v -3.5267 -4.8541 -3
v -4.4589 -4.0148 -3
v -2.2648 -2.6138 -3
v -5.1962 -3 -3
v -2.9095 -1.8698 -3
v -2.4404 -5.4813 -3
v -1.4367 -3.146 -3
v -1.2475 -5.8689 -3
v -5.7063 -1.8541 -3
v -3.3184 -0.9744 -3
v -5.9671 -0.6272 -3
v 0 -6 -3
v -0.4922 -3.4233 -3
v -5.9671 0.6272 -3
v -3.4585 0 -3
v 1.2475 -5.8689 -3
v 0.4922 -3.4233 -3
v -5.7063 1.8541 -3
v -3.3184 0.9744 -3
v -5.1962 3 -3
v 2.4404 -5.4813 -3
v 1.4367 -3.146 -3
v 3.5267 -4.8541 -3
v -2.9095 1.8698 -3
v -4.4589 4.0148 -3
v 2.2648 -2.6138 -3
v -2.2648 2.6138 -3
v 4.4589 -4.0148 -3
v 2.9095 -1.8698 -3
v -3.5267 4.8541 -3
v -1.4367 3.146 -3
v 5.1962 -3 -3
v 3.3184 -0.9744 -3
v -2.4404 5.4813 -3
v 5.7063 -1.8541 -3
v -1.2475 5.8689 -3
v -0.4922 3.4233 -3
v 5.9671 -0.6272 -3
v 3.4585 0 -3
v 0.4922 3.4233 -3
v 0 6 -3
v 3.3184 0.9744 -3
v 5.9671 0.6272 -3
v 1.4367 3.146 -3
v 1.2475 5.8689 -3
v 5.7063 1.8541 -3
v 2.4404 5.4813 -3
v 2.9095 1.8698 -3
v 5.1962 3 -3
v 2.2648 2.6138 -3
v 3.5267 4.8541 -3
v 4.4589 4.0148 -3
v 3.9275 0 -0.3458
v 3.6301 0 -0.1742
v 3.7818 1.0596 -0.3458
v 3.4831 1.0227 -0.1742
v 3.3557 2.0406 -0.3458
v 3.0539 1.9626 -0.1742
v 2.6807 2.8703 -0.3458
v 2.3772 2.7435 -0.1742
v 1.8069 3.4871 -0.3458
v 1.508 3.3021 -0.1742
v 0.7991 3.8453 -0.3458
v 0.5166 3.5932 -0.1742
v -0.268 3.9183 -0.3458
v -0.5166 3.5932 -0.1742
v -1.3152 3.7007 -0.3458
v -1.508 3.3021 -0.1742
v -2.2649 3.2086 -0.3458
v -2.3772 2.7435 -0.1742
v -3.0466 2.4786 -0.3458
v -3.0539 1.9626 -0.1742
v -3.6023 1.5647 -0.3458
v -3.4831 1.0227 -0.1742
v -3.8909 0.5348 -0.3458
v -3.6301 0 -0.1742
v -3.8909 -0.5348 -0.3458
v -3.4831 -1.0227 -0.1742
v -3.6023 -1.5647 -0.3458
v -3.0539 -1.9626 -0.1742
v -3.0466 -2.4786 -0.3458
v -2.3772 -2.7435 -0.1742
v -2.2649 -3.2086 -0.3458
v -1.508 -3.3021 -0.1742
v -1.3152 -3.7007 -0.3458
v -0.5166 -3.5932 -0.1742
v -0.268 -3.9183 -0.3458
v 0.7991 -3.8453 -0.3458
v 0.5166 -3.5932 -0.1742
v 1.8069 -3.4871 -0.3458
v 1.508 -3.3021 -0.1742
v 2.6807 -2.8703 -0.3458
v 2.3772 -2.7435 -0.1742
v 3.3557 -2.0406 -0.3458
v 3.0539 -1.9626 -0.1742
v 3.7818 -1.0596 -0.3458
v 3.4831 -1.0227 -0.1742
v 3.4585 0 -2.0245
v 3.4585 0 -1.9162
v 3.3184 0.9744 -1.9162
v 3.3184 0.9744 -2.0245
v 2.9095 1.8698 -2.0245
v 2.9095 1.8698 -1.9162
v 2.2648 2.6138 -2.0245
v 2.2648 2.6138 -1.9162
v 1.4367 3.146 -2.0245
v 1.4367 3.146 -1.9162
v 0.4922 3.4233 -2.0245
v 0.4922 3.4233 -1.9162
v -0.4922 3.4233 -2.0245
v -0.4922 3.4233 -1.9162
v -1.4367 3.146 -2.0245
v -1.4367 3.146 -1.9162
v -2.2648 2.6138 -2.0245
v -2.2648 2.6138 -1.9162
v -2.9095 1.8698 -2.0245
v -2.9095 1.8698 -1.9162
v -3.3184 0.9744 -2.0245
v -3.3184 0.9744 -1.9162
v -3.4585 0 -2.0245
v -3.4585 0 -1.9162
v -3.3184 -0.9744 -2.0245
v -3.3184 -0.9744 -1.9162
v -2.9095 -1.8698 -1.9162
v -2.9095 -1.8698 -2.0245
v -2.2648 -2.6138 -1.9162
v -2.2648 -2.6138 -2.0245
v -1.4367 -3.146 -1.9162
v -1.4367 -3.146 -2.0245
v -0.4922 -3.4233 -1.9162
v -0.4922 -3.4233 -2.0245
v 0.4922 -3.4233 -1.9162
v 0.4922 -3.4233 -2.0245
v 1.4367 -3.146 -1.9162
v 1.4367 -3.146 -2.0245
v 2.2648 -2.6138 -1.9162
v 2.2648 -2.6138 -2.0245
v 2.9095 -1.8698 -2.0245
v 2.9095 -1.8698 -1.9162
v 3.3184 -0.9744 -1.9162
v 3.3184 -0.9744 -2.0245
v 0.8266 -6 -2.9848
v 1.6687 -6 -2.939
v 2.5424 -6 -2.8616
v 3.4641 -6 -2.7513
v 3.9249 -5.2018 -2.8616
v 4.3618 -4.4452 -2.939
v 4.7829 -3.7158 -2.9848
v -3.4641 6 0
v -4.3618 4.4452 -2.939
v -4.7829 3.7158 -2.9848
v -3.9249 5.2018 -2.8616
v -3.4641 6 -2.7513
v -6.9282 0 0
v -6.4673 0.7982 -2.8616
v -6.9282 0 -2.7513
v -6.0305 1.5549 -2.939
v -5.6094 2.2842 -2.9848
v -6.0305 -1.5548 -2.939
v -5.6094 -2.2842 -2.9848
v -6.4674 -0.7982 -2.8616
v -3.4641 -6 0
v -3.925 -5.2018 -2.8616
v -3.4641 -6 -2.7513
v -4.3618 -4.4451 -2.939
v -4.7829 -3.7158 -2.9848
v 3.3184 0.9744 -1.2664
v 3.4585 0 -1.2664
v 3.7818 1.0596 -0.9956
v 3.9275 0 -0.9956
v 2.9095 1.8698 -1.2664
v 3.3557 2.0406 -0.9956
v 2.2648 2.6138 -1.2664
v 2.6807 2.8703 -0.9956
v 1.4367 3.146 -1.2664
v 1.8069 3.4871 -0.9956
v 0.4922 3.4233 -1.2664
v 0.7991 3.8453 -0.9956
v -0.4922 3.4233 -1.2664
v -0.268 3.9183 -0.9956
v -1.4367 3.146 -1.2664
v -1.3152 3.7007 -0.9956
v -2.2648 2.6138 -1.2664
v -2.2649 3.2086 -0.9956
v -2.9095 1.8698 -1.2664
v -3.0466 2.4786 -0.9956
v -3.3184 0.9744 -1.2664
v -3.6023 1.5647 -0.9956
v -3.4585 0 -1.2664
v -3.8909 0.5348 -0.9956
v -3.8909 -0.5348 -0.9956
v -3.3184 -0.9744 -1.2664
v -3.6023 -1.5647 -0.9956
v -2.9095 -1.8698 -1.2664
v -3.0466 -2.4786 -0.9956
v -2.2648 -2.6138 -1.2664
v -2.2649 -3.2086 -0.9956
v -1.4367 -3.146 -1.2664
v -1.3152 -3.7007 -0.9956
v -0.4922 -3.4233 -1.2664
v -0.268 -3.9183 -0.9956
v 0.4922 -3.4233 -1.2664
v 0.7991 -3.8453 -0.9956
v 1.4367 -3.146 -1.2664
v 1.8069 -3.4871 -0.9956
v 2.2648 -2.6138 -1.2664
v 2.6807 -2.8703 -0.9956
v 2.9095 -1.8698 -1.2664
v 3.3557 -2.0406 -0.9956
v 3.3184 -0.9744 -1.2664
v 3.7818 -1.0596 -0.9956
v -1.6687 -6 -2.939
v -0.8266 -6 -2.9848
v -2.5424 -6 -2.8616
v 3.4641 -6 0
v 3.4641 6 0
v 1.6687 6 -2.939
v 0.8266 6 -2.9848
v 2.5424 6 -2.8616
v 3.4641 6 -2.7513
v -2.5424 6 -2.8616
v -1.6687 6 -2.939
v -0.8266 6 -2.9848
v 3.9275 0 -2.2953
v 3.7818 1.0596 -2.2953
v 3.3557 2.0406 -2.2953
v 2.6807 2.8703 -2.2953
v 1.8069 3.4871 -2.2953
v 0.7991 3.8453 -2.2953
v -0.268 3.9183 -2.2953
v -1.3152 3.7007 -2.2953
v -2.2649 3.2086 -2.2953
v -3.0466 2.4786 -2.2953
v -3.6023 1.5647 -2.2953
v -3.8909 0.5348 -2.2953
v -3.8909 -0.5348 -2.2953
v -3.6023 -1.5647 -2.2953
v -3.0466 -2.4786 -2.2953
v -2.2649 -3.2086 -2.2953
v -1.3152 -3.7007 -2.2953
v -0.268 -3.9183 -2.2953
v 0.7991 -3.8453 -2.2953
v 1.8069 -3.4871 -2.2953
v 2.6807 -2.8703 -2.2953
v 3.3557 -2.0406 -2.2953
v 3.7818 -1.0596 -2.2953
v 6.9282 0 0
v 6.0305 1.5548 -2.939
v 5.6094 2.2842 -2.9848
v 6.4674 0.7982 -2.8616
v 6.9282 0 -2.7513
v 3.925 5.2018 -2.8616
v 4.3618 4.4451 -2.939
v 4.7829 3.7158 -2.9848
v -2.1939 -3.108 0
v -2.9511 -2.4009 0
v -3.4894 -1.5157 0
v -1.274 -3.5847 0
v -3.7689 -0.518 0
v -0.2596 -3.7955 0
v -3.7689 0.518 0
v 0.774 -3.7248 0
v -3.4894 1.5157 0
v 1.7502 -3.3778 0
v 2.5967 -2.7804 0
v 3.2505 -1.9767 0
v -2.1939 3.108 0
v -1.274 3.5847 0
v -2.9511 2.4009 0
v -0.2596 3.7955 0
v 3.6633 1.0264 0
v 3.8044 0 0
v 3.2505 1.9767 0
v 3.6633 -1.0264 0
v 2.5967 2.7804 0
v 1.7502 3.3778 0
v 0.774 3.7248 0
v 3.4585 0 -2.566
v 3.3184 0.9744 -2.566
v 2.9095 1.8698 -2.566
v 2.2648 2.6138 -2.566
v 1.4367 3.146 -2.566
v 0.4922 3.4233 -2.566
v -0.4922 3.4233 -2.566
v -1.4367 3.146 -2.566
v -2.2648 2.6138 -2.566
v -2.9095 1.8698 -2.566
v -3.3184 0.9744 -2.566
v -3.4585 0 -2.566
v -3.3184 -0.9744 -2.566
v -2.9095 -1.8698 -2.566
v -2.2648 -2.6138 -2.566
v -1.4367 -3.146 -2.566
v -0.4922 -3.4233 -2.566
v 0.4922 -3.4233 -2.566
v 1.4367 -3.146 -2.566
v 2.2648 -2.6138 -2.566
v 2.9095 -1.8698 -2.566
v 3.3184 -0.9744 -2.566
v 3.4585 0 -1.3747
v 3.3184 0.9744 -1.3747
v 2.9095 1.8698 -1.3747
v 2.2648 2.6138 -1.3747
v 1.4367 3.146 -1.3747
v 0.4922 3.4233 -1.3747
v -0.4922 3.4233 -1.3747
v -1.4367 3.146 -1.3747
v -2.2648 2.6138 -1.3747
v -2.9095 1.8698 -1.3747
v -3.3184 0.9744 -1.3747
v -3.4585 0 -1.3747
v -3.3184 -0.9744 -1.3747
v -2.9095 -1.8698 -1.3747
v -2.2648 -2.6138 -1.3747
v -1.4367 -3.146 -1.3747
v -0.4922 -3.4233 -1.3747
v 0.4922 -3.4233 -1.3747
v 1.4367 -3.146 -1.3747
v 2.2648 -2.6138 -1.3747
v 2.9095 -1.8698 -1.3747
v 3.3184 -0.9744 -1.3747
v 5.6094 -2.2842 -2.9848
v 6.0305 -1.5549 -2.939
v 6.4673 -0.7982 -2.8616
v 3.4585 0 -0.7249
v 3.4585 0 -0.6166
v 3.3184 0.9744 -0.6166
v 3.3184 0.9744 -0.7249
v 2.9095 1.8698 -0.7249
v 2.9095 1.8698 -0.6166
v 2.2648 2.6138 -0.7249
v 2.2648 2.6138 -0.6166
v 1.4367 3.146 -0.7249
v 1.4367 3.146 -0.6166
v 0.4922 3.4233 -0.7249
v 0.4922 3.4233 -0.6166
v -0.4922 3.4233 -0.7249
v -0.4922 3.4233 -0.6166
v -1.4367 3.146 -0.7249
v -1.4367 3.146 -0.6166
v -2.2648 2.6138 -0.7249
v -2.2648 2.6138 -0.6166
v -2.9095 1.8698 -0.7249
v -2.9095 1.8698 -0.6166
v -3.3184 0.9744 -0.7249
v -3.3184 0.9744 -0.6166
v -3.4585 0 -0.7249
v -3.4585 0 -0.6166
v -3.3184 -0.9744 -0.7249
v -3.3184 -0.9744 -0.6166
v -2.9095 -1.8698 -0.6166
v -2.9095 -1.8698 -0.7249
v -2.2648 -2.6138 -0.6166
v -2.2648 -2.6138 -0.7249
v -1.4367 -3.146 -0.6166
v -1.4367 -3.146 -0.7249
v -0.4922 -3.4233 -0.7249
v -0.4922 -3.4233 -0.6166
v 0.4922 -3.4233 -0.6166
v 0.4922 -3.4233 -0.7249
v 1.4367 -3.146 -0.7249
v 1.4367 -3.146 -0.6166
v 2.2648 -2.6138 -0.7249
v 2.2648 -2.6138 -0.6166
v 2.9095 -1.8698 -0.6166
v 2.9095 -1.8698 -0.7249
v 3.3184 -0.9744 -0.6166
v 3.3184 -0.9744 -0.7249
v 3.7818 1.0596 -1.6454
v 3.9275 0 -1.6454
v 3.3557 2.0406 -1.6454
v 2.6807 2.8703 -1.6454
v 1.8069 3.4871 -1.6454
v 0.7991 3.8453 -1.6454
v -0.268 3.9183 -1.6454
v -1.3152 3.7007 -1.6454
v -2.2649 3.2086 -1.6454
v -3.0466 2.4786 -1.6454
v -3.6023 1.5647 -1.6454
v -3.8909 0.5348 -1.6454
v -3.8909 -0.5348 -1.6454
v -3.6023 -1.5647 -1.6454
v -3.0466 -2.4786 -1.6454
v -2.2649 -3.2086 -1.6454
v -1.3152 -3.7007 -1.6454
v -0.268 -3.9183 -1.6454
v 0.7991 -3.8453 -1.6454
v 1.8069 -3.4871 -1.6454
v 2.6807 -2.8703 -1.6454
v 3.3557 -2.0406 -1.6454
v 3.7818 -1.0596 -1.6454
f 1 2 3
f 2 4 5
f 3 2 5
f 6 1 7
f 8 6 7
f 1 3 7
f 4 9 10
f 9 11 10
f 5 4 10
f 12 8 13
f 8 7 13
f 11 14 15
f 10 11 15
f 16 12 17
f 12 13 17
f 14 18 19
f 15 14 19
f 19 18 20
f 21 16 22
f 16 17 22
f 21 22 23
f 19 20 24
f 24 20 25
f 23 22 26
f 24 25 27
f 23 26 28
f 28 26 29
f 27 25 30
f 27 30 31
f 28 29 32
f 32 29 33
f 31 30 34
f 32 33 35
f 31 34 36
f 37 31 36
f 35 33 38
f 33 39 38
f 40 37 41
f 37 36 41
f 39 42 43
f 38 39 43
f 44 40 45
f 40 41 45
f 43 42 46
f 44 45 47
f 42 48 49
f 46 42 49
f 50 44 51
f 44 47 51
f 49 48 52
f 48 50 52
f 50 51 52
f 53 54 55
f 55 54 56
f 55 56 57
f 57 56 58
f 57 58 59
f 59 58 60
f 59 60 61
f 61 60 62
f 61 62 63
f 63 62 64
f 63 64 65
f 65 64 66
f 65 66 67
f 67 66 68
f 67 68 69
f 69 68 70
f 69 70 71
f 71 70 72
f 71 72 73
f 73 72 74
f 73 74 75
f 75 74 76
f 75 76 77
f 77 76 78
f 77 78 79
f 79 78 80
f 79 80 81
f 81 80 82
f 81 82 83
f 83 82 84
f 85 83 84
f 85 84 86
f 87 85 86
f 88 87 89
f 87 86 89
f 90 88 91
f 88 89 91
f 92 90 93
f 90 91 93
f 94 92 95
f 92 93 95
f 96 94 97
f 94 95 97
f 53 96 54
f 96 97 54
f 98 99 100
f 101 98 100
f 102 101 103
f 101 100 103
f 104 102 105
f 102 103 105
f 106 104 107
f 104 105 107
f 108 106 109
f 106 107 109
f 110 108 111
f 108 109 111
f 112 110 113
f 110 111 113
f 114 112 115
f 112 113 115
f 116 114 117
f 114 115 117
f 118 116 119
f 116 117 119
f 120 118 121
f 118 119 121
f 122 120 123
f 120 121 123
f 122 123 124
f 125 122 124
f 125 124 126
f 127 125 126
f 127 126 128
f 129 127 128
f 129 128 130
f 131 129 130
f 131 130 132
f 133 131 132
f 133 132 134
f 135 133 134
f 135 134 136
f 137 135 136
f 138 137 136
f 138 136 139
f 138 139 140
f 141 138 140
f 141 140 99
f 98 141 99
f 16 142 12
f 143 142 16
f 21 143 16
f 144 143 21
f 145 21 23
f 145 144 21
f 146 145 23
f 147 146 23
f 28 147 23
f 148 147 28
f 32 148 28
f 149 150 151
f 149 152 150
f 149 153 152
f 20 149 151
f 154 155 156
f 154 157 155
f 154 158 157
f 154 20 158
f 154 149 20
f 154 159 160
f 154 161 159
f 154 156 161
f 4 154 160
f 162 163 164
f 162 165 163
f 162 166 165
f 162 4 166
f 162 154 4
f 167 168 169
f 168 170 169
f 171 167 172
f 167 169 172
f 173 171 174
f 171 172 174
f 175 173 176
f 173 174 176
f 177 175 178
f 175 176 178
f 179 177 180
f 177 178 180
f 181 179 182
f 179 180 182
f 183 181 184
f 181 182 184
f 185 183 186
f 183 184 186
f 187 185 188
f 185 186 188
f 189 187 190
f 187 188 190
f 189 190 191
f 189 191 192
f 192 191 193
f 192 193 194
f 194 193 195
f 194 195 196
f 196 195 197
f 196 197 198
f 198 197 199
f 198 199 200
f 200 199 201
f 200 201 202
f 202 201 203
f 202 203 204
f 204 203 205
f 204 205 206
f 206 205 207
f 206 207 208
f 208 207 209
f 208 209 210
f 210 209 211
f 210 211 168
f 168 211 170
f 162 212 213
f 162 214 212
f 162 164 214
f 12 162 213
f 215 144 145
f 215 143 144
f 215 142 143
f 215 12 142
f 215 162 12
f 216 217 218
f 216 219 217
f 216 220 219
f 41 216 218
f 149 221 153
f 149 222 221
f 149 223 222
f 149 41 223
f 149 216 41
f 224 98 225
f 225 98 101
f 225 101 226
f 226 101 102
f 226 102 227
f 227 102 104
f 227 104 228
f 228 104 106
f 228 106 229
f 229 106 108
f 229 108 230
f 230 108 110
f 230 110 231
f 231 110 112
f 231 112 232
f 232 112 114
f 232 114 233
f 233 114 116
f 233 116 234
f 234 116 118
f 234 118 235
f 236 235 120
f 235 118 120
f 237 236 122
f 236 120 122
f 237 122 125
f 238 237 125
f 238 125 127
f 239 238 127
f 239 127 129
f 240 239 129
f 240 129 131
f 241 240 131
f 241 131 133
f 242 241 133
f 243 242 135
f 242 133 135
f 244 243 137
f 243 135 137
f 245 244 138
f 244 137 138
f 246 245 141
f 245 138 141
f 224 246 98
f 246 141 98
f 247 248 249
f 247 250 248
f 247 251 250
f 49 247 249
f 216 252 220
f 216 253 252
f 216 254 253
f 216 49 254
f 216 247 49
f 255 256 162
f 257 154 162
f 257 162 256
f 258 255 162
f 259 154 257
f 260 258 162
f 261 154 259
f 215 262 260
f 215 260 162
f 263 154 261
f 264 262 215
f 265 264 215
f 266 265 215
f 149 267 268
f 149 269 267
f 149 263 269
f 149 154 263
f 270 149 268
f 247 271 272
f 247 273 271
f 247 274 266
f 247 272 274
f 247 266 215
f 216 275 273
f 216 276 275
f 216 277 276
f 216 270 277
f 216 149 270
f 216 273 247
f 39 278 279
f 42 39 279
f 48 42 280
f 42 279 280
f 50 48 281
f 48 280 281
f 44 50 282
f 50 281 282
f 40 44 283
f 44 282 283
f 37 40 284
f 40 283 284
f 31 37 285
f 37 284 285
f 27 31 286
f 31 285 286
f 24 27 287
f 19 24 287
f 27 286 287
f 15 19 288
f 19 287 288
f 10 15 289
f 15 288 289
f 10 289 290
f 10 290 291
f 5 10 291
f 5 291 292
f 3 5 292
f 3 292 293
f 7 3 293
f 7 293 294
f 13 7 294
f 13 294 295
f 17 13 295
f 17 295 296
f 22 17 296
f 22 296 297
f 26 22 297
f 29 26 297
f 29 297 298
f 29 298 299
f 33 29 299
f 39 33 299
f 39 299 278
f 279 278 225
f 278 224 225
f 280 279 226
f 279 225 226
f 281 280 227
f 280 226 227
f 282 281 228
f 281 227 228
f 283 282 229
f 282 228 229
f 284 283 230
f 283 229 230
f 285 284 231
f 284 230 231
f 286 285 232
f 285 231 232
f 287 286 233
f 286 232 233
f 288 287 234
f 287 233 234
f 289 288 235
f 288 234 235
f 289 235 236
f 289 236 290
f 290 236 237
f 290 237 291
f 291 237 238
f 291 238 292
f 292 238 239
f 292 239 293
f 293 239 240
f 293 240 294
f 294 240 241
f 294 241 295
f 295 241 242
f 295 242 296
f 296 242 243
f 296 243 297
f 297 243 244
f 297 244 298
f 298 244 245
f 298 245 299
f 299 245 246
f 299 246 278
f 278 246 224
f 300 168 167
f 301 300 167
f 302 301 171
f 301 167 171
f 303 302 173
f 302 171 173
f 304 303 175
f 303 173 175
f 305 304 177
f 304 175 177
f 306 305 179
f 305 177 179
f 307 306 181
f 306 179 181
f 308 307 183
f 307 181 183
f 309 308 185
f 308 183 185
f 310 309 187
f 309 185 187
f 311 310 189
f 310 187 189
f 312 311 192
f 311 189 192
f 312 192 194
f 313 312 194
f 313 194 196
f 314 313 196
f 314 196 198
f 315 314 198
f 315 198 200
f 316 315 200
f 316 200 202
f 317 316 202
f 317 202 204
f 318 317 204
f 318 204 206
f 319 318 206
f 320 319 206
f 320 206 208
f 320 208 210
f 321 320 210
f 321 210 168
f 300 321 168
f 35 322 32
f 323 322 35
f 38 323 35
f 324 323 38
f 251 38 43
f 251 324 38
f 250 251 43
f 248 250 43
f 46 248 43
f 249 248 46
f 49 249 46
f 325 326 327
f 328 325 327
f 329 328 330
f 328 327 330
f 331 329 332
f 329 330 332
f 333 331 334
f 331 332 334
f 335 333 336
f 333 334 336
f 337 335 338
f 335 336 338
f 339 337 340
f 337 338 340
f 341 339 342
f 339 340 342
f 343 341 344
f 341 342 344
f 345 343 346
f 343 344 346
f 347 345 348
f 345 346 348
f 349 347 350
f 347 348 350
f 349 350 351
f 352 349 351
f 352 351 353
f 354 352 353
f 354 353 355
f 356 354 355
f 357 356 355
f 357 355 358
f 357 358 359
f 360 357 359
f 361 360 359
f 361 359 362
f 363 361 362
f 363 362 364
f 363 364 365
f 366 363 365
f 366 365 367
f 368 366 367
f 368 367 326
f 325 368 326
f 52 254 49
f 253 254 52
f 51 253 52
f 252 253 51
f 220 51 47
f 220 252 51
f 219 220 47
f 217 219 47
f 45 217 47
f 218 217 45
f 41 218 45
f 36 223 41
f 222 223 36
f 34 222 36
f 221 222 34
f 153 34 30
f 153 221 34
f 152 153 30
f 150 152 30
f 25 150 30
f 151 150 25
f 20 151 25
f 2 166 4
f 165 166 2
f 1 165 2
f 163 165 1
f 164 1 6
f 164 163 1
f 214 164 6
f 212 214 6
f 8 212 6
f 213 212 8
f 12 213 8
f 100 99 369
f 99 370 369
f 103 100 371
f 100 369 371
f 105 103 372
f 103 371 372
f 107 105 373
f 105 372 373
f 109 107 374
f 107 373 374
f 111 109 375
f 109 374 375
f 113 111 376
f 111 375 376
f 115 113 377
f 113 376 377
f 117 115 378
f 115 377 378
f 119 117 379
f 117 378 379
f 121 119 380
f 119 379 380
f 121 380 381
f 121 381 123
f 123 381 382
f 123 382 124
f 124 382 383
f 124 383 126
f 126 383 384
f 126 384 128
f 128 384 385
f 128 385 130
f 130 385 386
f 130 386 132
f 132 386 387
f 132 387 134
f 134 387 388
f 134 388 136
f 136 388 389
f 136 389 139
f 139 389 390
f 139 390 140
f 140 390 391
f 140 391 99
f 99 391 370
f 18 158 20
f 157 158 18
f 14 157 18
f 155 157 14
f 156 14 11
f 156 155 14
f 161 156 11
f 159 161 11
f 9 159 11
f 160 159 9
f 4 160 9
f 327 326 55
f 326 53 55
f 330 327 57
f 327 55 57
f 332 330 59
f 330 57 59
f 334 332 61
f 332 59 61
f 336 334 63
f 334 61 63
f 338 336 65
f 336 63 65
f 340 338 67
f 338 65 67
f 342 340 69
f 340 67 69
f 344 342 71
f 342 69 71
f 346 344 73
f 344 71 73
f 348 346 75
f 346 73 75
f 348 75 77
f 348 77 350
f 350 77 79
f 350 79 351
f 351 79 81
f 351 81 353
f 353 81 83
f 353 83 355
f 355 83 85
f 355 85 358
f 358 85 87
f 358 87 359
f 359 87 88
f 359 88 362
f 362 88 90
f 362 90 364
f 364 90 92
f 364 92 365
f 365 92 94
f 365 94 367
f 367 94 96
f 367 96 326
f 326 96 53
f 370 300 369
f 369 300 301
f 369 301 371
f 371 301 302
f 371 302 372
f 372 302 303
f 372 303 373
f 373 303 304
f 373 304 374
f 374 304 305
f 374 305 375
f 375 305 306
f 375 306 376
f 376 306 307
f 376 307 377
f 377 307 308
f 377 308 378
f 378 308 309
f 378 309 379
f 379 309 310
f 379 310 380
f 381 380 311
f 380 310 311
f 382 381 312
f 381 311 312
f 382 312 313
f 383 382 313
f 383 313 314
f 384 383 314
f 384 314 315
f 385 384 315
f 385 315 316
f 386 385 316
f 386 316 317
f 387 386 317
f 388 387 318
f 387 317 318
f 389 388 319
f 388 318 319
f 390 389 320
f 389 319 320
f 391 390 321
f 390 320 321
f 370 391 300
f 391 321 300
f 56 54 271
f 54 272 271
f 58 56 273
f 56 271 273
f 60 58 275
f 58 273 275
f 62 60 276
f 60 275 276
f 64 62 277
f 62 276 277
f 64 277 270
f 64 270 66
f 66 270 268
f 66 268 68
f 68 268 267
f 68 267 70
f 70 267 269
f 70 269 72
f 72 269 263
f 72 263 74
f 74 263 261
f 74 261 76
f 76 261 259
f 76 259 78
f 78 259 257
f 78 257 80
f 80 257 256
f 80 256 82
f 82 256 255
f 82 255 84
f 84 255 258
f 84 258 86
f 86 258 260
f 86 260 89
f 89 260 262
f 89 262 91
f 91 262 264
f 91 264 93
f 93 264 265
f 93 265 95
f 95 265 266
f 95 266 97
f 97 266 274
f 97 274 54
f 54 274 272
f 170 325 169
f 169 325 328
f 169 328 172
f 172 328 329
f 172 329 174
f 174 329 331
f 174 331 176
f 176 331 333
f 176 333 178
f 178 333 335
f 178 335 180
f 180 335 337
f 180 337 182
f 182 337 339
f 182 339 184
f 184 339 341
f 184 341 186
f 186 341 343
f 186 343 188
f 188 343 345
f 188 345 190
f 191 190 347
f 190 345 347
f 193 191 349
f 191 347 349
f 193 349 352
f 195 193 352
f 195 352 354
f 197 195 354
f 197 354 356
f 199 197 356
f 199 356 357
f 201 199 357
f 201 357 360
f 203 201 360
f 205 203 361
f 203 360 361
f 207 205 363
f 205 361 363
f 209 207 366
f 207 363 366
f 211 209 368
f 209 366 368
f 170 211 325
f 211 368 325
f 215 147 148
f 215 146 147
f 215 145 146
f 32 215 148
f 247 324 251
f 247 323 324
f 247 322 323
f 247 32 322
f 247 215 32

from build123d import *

# Parameters (mm, degrees)
SKETCH1_R        = 3.4585
BASENUT_DEPTH    = 3
CHAMFER1_SIZE    = 0.34585
LPATTERN10_COUNT = 4
LPATTERN10_PITCH = 0.6498


with BuildPart() as part:
    # Sketch1 → BaseNut (new body)
    with BuildSketch(Plane.XY):
        Polygon((3.464101615, -6), (6.92820323, 0), (3.464101615, 6), (-3.464101615, 6), (-6.92820323, 0), (-3.464101615, -6), align=None)
        Circle(SKETCH1_R, mode=Mode.SUBTRACT)
    extrude(amount=-BASENUT_DEPTH)

    # Sketch2 → Double-Chamfer (revolve, cut)
    with BuildSketch(Plane(origin=(0, 0, 0), x_dir=(1, 0, 0), z_dir=(0, 1, 0))):
        Polygon((-6.92820323, 3), (-6, 3), (-6.92820323, 2.751288694), align=None)
    revolve(axis=Axis((0, 0, -3.375940562), (0, 0, 1)), mode=Mode.SUBTRACT)

    # Chamfer1
    chamfer1_edges = [part.edges().sort_by_distance(p)[0] for p in [
        (-3.4585, 0, 0),
    ]]
    chamfer(chamfer1_edges, length=CHAMFER1_SIZE)

    # Sketch3 → Cut-Revolve10 (revolve, cut)
    with BuildSketch(Plane(origin=(0, 0, 0), x_dir=(1, 0, 0), z_dir=(0, 1, 0))):
        Polygon((2.917, 0.6166), (3.4585, 0.6166), (3.927452756, 0.34585), (3.4585, 0.0751), (2.917, 0.0751), align=None)
    cut_revolve10 = revolve(axis=Axis((0, 0, -2.739364781), (0, 0, 1)), mode=Mode.SUBTRACT)

    # LPattern10: Cut-Revolve10 ×4
    with Locations(*[(0, 0, -i * LPATTERN10_PITCH) for i in range(1, LPATTERN10_COUNT)]):
        add(cut_revolve10, mode=Mode.SUBTRACT)


solid = part.part
